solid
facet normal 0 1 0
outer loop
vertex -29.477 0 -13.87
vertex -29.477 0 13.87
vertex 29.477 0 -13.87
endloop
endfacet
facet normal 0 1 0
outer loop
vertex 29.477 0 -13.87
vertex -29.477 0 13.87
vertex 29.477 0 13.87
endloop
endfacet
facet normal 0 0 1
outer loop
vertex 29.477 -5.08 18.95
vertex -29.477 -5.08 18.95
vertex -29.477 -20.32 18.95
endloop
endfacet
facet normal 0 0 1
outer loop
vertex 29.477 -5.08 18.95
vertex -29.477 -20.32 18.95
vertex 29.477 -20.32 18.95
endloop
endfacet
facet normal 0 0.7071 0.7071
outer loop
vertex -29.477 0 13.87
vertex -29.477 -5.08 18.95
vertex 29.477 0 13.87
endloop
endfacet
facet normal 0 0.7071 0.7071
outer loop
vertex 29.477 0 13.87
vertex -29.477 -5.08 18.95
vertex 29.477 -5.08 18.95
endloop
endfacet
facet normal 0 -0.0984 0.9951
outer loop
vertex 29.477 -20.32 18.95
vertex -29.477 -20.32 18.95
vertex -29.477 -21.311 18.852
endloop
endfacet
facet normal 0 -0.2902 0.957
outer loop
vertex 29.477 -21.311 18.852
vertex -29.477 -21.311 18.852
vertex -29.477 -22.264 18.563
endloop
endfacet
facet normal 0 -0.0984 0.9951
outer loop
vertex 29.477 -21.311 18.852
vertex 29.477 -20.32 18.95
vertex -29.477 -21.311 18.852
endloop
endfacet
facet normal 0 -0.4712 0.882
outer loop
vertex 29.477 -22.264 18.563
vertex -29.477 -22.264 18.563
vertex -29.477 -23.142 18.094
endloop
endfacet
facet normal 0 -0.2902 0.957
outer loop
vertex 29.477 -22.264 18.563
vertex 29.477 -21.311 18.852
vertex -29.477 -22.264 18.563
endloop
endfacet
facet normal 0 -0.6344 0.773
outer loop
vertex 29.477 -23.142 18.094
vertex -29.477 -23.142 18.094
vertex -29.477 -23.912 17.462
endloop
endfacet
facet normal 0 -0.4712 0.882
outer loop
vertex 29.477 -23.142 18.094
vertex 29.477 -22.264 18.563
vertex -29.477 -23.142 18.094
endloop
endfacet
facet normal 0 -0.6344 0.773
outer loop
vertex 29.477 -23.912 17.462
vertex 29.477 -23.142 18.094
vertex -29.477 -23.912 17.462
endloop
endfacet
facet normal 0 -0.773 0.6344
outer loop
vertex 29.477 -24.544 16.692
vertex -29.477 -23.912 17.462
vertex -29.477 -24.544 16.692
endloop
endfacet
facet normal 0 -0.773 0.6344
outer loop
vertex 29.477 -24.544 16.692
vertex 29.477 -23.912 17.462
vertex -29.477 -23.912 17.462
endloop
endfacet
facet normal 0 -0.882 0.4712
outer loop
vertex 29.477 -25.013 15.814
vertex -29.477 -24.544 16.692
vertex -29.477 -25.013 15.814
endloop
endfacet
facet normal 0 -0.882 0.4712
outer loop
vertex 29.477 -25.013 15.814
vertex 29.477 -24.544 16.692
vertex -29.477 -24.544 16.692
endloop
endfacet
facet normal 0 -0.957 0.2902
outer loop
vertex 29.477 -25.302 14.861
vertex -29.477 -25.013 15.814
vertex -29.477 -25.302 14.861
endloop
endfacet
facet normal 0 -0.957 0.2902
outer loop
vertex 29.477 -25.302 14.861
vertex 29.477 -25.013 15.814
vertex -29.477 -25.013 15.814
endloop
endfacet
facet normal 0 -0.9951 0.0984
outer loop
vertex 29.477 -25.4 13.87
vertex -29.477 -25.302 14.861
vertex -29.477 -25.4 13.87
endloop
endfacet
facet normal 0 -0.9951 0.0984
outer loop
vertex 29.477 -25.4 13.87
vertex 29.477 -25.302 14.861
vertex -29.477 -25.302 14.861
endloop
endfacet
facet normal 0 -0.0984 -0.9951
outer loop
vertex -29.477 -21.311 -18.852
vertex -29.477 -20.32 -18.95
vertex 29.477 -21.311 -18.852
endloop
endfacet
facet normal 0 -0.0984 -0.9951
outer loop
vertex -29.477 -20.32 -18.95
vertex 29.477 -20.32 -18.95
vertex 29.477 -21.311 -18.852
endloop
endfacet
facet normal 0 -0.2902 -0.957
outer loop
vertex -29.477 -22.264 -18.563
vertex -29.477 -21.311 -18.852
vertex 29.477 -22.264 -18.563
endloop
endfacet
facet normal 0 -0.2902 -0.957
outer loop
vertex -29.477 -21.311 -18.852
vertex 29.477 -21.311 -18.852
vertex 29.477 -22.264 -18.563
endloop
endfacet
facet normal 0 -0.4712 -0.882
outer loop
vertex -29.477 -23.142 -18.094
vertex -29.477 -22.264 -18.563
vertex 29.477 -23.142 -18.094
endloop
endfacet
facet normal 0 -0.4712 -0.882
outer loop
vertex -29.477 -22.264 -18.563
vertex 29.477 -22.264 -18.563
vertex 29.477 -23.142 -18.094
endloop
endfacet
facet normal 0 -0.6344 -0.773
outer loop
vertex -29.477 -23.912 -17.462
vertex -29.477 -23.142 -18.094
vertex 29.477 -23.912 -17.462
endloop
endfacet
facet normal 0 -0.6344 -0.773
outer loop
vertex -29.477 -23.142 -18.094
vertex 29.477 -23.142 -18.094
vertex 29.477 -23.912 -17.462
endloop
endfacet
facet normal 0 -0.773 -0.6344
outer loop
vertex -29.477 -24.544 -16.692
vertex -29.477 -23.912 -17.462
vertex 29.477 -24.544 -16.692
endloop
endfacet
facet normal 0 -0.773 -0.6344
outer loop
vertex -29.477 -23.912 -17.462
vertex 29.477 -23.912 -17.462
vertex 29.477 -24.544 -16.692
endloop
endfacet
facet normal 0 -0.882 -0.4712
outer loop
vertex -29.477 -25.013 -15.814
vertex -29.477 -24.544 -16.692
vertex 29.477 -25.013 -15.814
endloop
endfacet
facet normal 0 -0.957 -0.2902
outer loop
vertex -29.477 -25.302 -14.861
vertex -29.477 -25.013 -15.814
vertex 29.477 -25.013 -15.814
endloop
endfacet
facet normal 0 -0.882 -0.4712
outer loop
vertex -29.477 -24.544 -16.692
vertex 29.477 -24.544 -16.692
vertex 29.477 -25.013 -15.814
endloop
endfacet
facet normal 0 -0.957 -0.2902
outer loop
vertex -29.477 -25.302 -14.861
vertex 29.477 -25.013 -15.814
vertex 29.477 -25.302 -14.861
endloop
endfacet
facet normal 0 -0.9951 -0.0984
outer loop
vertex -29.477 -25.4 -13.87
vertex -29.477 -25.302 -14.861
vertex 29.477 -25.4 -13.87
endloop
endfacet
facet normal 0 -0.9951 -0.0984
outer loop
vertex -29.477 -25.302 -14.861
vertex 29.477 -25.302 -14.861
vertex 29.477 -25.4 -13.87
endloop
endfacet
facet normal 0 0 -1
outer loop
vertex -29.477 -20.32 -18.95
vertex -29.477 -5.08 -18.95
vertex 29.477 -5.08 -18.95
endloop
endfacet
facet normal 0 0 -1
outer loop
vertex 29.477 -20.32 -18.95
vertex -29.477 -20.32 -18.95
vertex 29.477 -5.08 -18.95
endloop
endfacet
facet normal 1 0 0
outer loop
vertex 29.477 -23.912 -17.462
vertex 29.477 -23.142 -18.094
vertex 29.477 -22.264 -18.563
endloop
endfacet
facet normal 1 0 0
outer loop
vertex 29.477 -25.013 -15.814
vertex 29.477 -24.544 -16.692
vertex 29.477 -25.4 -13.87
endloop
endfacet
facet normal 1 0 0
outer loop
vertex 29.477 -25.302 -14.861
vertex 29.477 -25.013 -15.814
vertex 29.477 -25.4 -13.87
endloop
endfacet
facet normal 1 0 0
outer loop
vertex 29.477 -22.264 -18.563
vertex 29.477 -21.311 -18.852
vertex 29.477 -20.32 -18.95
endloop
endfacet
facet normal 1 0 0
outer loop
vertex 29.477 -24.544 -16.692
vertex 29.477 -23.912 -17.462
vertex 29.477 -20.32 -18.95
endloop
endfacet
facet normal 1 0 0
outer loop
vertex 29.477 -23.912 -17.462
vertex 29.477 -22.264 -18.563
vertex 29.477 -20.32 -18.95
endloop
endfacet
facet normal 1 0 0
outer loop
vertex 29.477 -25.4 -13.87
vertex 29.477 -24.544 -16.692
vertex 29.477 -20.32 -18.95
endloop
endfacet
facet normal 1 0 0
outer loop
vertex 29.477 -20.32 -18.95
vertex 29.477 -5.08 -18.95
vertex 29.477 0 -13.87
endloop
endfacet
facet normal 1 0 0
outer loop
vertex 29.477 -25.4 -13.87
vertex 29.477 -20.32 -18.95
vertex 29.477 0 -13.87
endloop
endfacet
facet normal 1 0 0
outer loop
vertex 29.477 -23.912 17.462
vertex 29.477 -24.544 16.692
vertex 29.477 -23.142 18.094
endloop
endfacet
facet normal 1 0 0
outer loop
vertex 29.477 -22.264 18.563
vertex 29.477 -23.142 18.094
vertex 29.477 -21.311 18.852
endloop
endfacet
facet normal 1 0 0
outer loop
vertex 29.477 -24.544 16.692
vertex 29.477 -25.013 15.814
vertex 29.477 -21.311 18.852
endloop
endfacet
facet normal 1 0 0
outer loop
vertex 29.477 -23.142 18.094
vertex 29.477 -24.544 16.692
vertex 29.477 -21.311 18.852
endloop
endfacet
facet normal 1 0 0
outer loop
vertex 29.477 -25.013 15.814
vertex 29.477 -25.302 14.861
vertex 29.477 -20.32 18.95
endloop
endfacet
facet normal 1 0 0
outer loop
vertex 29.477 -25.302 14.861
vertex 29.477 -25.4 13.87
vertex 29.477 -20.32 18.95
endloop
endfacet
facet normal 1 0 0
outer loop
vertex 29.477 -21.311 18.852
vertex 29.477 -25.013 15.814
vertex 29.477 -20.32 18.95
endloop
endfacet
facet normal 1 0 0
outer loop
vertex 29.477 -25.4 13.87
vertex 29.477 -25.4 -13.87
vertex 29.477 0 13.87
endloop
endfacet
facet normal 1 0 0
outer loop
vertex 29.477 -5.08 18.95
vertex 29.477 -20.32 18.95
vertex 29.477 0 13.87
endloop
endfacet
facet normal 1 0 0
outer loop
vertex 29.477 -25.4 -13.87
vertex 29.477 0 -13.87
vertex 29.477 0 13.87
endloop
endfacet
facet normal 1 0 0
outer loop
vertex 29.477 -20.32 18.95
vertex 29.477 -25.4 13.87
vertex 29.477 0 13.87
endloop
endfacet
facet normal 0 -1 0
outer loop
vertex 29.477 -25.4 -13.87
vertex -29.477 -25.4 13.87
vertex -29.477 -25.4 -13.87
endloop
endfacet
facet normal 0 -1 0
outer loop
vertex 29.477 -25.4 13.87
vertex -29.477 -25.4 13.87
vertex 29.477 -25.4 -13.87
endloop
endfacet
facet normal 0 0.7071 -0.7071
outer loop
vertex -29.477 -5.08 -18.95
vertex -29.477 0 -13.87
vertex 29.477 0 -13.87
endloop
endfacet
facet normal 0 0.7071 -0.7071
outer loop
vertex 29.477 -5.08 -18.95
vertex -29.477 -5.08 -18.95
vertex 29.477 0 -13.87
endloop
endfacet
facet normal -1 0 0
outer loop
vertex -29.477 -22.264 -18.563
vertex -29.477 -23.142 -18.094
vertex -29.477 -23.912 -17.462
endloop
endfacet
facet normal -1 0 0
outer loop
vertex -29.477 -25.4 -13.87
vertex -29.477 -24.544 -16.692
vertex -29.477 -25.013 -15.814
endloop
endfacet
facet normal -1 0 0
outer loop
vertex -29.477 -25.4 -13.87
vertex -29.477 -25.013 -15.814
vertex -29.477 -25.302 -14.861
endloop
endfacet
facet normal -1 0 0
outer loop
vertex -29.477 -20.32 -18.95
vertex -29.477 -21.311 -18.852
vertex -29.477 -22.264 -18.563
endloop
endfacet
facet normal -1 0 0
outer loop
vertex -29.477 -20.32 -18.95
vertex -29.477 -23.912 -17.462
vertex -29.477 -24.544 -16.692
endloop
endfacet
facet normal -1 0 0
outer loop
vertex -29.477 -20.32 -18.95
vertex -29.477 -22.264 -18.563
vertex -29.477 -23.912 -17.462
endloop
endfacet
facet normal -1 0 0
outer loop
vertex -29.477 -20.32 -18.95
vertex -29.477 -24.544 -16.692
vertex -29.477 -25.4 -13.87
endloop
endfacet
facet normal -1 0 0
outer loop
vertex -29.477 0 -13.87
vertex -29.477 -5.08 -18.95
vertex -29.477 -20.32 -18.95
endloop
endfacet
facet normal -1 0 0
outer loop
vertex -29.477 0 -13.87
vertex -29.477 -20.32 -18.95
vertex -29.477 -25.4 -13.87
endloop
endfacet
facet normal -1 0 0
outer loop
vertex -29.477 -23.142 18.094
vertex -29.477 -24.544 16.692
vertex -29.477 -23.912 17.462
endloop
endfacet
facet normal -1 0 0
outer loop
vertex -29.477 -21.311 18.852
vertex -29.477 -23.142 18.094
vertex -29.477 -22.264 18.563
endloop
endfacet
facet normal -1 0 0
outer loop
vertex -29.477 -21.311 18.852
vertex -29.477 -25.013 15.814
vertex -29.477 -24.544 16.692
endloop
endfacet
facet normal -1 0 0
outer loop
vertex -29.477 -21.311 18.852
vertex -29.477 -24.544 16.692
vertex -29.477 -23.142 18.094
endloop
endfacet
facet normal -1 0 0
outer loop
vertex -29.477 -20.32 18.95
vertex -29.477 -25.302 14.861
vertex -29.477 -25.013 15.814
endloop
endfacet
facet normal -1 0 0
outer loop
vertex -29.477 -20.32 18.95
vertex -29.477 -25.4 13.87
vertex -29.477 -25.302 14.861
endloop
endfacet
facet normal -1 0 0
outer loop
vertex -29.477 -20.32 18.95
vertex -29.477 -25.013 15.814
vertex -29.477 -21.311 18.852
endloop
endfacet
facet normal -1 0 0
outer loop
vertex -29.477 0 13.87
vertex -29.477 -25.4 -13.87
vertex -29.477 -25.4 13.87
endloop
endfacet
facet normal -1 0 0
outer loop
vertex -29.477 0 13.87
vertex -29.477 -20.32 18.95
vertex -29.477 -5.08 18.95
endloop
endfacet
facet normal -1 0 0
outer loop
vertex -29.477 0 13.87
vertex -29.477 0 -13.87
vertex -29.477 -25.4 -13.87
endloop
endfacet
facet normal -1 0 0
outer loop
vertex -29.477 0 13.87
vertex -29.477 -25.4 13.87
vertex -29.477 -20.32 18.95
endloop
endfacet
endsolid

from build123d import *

# Parameters (mm, degrees)
F0_W     = 58.954738
F0_H     = 37.899476
F1_DEPTH = 25.4
F2_R     = 5.08
F3_SIZE  = 5.08


with BuildPart() as f1:
    # F0 (on Front) → F1 (new body)
    with BuildSketch(Plane.XZ):
        Rectangle(F0_W, F0_H)
    extrude(amount=F1_DEPTH)

    # F2
    f2_edges = [f1.edges().sort_by_distance(p)[0] for p in [
        (0, -25.4, 18.949738),
        (0, -25.4, -18.949738),
    ]]
    fillet(f2_edges, radius=F2_R)

    # F3
    f3_edges = [f1.edges().sort_by_distance(p)[0] for p in [
        (0, 0, -18.949738),
        (0, 0, 18.949738),
    ]]
    chamfer(f3_edges, length=F3_SIZE)


solid = f1.part
